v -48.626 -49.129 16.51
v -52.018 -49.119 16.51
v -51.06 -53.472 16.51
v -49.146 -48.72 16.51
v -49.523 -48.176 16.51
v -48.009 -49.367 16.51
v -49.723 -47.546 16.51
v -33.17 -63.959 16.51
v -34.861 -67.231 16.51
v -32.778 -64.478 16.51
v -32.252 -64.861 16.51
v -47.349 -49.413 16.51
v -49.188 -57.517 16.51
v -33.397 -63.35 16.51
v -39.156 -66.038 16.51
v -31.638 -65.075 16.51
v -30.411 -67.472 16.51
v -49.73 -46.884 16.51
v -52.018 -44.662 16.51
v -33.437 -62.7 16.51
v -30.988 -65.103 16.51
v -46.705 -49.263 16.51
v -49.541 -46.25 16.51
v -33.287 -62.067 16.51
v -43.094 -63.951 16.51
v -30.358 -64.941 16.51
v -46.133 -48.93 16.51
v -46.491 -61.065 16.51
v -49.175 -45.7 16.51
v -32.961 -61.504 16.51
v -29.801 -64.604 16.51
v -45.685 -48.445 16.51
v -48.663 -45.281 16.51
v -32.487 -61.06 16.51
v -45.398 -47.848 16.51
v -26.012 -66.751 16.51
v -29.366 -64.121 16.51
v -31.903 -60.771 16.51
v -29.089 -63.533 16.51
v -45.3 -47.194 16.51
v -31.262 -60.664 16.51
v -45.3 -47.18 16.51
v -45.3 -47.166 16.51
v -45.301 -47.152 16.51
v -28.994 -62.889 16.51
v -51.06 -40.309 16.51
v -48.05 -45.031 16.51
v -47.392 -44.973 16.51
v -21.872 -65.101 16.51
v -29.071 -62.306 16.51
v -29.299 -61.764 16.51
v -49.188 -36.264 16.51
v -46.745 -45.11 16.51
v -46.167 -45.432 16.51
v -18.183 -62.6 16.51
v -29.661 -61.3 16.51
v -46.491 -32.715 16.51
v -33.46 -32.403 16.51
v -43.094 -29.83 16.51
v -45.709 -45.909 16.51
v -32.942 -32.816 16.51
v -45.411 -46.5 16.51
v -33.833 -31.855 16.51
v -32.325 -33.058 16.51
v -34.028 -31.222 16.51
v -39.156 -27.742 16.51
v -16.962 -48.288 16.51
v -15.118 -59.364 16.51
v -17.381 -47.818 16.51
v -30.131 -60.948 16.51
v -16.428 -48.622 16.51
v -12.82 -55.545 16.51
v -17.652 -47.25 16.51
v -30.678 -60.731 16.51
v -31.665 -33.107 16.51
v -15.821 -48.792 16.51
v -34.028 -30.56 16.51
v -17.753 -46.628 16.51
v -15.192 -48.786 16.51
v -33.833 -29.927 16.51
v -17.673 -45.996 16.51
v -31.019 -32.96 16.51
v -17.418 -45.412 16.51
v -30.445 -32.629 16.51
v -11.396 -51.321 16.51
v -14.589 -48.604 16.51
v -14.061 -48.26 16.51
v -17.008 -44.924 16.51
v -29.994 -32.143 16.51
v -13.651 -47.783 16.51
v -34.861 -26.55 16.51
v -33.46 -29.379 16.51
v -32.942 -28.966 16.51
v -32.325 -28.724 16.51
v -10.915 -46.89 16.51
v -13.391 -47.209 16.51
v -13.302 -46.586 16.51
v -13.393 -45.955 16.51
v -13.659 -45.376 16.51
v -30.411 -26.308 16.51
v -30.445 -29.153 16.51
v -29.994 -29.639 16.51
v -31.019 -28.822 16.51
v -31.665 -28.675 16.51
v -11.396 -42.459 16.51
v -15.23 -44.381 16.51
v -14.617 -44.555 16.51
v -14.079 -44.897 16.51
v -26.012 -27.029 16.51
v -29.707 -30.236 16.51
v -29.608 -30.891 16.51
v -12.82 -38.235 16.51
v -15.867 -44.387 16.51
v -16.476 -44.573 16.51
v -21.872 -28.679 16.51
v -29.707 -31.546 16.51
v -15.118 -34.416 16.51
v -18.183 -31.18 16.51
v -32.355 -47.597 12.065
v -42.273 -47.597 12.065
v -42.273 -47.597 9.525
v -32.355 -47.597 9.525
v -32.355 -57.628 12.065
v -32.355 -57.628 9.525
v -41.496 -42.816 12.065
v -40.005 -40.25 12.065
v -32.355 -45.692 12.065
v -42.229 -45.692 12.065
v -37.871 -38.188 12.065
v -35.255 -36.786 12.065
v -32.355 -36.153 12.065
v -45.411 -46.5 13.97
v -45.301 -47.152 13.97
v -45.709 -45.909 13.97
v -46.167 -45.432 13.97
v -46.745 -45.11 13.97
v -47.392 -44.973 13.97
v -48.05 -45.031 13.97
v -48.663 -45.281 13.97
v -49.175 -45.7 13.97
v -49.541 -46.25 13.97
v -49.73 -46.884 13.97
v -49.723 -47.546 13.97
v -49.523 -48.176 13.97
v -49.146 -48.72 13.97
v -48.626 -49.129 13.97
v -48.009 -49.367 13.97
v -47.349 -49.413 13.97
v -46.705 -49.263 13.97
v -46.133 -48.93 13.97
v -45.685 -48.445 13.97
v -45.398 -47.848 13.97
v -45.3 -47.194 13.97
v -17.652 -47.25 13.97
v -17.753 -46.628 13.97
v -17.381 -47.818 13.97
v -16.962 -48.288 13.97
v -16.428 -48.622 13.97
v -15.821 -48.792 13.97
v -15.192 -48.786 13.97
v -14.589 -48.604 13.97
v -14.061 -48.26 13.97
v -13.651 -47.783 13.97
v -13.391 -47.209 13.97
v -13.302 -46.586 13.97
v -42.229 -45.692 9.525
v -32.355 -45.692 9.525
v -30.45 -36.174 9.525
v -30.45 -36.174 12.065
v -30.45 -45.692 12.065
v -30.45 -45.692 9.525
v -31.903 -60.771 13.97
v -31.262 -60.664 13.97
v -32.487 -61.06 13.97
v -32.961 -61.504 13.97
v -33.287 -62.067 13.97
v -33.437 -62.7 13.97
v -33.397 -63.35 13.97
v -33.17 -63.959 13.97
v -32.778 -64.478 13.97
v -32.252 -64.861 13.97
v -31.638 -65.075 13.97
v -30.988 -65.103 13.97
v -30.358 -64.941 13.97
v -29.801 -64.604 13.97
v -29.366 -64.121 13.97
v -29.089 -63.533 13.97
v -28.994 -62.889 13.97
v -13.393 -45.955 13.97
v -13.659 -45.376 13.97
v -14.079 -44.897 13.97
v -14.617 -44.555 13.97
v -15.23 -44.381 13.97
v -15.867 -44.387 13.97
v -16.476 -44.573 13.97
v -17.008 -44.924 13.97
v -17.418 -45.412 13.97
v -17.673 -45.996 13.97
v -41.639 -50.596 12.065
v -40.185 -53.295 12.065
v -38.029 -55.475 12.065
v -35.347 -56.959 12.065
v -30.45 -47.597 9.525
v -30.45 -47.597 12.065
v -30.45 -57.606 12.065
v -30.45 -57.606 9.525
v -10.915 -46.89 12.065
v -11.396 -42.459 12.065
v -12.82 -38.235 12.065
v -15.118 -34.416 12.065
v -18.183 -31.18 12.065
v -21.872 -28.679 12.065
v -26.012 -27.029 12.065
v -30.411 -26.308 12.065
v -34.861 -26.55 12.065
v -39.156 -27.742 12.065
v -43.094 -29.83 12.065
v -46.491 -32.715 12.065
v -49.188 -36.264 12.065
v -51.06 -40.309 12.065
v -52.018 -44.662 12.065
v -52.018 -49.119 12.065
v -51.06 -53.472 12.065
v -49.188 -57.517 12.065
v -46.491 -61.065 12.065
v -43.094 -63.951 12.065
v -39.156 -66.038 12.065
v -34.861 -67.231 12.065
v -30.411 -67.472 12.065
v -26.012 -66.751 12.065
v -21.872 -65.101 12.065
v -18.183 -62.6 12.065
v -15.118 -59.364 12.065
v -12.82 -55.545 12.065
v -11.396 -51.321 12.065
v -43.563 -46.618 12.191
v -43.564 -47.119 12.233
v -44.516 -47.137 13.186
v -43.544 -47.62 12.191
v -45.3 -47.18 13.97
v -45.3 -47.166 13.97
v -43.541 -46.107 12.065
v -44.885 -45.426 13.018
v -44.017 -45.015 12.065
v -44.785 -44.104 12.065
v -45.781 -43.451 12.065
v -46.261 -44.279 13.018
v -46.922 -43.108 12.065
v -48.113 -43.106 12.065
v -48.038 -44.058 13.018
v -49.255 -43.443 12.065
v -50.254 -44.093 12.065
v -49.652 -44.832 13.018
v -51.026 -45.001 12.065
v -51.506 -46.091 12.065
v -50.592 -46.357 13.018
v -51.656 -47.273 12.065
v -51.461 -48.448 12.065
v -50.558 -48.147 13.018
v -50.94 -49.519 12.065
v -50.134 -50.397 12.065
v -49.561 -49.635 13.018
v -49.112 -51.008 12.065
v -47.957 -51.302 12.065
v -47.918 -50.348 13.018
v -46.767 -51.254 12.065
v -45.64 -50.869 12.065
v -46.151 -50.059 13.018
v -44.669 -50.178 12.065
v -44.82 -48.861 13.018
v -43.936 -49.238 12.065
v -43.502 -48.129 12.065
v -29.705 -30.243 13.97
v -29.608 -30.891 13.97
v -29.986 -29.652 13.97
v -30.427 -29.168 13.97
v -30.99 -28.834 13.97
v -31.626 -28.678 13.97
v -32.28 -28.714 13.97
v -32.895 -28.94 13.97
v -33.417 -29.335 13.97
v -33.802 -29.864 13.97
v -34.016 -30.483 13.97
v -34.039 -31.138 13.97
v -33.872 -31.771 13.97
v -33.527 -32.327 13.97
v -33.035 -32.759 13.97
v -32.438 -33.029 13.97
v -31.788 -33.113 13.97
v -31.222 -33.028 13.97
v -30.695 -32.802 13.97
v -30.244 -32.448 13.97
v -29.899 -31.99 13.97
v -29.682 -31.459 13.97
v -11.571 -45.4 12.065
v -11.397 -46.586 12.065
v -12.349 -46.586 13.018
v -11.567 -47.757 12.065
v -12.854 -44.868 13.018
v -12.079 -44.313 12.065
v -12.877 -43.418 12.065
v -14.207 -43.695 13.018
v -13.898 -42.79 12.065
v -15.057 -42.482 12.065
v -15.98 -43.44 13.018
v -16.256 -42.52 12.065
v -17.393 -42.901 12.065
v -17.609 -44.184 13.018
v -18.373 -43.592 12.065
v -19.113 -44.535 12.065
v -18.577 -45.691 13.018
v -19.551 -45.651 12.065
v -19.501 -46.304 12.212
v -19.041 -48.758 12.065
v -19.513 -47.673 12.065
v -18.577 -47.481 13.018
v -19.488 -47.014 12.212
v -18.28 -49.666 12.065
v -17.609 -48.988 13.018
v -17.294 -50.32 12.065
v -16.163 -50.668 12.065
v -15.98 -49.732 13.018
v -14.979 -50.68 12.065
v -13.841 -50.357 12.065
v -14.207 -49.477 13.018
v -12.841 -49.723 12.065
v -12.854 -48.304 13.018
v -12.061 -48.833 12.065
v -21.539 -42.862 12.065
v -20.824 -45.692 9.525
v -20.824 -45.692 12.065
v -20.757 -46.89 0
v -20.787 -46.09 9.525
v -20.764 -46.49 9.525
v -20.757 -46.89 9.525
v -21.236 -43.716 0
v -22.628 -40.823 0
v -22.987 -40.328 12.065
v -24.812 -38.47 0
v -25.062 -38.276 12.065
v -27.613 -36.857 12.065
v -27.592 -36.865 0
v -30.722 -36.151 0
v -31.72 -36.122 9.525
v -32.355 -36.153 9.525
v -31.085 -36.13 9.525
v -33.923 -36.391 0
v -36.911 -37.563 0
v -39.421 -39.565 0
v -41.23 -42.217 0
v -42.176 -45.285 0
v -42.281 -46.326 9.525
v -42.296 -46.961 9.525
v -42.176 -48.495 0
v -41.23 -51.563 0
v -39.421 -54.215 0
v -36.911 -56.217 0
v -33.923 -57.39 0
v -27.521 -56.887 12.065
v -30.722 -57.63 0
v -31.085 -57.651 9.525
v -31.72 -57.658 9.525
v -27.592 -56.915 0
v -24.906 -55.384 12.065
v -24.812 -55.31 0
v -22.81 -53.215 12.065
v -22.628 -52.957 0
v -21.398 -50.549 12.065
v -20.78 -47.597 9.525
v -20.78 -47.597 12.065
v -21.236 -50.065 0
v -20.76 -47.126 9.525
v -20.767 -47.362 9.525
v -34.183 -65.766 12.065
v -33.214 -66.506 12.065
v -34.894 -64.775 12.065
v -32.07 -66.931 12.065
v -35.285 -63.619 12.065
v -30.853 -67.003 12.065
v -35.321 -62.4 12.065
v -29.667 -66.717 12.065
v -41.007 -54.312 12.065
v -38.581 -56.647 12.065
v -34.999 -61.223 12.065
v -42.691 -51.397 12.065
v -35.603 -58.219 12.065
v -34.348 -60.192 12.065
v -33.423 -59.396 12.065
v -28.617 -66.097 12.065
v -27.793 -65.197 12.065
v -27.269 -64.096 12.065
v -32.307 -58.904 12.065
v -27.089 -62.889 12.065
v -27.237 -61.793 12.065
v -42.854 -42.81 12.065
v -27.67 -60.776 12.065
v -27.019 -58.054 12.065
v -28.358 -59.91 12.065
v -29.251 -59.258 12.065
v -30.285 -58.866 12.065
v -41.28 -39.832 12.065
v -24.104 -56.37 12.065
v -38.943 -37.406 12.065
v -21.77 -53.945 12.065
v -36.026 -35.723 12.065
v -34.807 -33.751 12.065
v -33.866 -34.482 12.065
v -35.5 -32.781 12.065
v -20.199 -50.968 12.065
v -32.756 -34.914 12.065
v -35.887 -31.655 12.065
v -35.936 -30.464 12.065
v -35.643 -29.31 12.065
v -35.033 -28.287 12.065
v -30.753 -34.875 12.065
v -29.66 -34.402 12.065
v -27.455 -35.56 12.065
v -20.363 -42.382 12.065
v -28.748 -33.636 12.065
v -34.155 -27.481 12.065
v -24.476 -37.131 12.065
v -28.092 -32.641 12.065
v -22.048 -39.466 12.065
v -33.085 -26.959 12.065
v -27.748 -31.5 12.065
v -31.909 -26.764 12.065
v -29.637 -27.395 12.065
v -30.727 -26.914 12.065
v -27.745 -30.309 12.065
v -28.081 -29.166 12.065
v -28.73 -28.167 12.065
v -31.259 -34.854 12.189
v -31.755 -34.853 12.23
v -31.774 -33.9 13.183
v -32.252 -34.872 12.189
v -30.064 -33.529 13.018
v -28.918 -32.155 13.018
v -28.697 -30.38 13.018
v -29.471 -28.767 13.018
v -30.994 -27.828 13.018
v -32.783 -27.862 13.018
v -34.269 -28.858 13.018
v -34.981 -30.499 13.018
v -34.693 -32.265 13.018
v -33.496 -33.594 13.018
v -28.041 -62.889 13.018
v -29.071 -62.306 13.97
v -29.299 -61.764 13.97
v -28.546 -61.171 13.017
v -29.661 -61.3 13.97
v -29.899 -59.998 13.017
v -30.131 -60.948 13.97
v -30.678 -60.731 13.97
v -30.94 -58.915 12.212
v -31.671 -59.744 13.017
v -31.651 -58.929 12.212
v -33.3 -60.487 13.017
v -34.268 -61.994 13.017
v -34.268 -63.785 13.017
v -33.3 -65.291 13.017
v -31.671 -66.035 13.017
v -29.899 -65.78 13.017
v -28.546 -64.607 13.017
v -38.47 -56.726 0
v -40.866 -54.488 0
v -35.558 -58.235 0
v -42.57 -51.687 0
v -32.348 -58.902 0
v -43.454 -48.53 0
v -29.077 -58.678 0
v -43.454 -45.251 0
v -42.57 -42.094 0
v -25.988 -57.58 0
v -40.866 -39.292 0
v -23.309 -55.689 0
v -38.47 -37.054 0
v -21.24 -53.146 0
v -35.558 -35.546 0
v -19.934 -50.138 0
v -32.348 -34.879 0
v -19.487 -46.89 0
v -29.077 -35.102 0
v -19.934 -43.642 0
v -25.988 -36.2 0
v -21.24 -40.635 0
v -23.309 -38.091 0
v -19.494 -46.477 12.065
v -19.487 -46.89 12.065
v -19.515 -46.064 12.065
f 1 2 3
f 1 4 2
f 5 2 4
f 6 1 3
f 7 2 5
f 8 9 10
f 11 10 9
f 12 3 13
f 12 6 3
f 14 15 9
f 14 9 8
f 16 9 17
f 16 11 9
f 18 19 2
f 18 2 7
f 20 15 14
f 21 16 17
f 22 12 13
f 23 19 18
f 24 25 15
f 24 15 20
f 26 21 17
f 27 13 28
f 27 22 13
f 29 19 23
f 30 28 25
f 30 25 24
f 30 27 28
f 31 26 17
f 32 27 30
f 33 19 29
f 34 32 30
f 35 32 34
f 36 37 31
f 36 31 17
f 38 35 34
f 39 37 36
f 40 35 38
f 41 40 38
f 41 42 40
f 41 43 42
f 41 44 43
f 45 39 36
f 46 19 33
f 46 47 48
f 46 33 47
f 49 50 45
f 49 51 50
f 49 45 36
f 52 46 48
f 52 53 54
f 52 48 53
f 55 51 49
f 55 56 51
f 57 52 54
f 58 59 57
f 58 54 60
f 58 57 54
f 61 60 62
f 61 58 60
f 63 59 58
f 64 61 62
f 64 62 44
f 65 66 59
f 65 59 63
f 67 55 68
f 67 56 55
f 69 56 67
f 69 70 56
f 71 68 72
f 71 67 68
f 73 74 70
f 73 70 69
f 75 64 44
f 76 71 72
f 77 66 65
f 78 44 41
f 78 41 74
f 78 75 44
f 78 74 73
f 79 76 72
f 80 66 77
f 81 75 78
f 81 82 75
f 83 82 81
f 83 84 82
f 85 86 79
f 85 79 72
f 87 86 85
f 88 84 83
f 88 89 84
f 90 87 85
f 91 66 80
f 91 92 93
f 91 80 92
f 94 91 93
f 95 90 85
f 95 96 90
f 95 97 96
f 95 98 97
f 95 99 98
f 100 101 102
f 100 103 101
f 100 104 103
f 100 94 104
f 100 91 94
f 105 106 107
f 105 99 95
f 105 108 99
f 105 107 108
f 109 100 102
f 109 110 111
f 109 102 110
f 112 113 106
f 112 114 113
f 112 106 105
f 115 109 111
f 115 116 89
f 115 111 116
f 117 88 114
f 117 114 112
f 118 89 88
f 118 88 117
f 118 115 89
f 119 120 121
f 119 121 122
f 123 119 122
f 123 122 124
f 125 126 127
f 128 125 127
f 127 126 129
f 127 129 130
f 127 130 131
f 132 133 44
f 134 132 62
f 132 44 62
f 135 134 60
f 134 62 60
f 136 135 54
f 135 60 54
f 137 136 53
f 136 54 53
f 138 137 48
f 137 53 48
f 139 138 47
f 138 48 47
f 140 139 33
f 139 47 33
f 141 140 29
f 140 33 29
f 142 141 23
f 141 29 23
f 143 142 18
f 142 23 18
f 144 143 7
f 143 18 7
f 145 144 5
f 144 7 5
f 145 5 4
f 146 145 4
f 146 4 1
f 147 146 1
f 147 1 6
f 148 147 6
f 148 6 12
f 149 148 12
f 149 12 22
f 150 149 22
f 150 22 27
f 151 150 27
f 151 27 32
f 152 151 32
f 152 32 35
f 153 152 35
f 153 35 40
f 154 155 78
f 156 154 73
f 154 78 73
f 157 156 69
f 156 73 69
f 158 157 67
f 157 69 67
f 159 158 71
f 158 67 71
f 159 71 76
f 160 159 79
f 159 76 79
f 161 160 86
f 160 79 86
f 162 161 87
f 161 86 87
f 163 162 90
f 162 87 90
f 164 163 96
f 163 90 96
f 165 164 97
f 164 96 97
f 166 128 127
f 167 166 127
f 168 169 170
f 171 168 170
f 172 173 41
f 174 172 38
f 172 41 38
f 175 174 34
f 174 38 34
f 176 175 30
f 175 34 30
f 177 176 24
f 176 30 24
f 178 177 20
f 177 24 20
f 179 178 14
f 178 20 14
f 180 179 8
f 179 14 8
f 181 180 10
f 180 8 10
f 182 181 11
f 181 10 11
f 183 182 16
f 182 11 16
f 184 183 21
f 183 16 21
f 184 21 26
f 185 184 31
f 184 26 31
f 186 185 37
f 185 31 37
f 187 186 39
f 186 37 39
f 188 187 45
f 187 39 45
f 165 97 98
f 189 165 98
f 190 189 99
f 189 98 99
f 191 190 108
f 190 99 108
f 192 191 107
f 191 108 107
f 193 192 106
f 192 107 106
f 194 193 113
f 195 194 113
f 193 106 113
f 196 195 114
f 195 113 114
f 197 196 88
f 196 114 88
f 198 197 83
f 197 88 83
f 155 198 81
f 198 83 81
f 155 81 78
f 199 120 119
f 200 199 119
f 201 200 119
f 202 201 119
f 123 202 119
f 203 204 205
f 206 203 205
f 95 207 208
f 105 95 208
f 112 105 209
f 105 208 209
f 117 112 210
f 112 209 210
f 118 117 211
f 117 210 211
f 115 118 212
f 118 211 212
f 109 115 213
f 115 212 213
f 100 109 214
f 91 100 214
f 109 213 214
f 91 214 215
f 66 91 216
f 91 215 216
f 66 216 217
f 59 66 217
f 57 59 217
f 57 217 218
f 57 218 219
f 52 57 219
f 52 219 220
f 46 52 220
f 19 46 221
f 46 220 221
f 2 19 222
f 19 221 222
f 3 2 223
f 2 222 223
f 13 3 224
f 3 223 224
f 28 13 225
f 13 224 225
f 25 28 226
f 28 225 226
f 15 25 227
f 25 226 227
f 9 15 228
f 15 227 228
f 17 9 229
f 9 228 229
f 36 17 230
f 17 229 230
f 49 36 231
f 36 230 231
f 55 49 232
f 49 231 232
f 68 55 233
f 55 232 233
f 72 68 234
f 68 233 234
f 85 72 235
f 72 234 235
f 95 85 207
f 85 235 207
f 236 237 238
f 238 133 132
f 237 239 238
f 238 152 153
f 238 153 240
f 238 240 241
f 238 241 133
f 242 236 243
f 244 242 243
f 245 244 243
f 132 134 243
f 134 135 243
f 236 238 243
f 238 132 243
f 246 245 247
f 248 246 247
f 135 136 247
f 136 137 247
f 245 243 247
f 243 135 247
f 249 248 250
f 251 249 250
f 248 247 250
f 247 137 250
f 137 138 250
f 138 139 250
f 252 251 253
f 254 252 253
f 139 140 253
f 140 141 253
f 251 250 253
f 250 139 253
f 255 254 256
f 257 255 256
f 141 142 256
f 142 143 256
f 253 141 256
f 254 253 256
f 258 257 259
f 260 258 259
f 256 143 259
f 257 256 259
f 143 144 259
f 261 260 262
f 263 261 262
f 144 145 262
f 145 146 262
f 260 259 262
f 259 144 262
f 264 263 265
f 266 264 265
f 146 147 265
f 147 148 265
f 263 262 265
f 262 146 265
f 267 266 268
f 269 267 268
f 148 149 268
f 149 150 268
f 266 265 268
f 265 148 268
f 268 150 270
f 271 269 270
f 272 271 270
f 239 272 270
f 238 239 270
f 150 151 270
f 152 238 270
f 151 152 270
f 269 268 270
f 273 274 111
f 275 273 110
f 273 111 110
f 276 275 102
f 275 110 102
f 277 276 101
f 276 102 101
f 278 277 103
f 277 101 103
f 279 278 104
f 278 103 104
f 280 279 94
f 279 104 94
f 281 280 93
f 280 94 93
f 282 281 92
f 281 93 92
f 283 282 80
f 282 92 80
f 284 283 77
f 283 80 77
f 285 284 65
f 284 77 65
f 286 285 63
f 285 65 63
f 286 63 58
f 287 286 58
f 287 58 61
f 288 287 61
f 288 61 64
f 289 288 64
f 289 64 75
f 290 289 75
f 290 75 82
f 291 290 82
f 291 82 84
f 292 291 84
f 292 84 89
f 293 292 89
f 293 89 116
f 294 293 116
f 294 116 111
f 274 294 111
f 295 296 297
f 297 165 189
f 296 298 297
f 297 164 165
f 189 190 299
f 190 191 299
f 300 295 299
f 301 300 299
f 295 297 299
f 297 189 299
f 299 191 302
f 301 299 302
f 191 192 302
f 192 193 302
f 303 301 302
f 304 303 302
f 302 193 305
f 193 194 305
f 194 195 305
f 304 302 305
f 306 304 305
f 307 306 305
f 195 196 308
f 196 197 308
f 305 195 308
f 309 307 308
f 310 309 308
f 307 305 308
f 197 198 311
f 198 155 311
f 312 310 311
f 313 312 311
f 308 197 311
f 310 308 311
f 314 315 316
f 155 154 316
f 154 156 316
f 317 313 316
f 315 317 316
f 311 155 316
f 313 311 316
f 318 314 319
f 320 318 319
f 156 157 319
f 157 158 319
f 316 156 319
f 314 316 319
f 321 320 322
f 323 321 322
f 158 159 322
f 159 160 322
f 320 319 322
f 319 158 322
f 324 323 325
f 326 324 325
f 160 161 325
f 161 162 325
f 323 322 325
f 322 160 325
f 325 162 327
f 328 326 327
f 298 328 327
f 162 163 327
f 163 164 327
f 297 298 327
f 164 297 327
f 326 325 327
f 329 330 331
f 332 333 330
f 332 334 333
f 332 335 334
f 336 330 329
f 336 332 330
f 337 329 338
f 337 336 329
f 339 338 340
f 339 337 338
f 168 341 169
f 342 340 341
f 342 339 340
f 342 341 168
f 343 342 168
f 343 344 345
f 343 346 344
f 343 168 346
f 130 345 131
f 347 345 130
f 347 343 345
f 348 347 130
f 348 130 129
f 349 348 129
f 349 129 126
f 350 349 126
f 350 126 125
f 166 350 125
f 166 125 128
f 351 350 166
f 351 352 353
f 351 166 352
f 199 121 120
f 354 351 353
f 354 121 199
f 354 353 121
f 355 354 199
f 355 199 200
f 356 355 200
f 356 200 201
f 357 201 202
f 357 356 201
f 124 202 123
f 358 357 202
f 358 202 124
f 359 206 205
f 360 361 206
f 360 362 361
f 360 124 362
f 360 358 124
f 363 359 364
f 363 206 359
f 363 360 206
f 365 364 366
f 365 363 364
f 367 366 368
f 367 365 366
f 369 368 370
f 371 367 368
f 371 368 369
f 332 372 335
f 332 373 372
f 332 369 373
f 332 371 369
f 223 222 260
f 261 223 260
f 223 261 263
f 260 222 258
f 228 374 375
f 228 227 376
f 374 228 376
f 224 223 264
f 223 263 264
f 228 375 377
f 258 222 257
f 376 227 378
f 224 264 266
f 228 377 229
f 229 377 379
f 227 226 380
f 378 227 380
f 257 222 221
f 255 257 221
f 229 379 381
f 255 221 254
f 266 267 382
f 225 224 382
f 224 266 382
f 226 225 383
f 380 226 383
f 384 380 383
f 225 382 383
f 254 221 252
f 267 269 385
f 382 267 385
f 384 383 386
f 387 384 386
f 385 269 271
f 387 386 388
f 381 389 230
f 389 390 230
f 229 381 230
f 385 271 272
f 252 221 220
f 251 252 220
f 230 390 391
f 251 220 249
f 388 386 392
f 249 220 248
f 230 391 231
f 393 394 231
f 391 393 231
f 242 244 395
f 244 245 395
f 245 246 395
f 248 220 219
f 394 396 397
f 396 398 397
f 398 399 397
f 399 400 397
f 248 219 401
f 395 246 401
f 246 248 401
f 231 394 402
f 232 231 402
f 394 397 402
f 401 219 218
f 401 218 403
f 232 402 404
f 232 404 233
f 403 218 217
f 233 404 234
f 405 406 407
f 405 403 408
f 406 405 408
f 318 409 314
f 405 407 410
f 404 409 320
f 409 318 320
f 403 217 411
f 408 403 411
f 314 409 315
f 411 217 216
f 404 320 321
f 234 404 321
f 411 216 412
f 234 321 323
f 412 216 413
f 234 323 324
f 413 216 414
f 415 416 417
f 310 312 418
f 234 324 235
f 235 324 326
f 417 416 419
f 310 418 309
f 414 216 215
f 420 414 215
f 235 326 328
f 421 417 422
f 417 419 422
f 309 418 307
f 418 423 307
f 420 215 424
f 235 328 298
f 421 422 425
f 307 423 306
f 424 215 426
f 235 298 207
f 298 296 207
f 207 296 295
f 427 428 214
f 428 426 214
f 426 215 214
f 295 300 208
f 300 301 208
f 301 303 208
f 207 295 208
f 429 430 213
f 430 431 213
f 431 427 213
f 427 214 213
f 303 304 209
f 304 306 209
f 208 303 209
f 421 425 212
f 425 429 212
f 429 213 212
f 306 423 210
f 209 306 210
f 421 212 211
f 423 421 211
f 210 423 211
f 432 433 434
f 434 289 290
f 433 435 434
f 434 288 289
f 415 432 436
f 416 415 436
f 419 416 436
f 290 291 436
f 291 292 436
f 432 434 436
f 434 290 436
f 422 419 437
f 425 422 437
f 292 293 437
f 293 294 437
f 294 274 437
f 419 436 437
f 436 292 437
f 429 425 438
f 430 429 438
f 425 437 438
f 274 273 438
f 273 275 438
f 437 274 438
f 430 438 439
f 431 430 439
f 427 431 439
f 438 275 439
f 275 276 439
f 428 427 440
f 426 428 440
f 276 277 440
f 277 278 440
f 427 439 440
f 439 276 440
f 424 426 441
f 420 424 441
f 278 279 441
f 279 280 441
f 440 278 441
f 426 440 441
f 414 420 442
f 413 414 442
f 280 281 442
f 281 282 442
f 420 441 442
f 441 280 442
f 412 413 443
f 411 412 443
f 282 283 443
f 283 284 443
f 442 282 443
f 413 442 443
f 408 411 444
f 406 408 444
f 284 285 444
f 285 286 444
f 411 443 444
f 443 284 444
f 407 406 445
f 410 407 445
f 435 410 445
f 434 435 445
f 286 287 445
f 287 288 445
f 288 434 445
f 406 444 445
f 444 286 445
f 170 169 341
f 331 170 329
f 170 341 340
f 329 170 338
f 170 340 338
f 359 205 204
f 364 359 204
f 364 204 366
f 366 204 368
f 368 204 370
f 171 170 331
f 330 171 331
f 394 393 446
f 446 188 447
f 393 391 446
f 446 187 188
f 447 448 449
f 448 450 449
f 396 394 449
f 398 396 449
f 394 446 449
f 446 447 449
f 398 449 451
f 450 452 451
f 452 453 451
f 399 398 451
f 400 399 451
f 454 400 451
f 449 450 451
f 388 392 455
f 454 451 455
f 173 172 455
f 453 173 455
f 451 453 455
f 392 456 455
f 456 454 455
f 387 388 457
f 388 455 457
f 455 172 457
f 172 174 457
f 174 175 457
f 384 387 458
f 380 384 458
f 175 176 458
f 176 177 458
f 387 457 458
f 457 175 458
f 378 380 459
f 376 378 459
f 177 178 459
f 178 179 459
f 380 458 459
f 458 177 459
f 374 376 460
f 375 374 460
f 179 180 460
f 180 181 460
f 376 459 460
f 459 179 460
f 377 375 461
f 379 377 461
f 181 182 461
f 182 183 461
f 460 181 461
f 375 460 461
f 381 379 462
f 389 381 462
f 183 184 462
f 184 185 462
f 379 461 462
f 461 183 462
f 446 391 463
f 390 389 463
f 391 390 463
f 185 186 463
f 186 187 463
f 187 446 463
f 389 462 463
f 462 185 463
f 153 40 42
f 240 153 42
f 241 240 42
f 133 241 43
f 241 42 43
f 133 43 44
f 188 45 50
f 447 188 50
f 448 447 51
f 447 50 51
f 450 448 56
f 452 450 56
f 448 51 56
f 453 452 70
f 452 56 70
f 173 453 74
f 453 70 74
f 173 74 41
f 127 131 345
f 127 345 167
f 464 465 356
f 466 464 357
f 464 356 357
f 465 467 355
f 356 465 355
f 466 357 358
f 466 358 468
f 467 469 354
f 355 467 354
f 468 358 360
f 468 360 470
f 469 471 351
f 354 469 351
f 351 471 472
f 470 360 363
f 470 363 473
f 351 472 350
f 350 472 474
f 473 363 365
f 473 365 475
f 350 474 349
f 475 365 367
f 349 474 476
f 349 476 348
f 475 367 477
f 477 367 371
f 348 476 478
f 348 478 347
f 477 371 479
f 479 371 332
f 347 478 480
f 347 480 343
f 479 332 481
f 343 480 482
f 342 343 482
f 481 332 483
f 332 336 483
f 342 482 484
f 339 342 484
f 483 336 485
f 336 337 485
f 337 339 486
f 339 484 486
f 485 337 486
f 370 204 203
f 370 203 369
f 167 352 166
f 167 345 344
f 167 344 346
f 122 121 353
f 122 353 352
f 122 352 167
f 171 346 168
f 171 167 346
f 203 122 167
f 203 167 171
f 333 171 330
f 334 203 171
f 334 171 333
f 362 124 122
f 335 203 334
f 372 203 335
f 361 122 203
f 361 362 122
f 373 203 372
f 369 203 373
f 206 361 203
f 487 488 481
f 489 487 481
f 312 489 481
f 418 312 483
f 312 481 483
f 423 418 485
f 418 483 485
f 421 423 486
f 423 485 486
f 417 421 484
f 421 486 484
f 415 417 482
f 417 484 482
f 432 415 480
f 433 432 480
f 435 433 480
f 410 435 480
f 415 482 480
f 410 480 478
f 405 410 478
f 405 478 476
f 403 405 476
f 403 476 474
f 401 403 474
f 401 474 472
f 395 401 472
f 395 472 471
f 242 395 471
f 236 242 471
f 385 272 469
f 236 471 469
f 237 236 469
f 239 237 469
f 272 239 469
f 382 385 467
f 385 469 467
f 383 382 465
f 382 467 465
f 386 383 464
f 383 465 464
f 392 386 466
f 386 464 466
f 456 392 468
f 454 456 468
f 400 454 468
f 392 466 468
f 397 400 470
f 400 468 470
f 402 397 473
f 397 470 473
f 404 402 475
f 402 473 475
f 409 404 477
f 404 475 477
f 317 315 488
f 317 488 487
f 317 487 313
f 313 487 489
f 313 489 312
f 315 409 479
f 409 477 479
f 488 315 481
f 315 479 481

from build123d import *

# Parameters (mm, degrees)
F0_R         = 12.0396
F0_R_2       = 10.7696
F1_DEPTH     = 12.065
F2_R         = 20.6121
F3_DEPTH     = 4.445
F5_DEPTH     = 16.511
F6_S5_R      = 12.0396
F6_T6_DEPTH  = 7
F6_S11_R     = 12.0396
F6_T12_DEPTH = 7
F6_S17_R     = 12.0396
F6_T18_DEPTH = 7
F6_S23_R     = 12.0396
F6_T24_DEPTH = 7
F7_W         = 10.7836972851
F7_H         = 1.905
F7_W_2       = 1.905
F7_H_2       = 10.8237928489
F7_W_3       = 10.1713027149
F7_H_3       = 10.1312071511
F8_DEPTH     = 2.54


# Not quite as in the source:
# - a fillet or chamfer that OpenCascade refuses, or shapes differently, is made with other operations: its cross-section is extruded or revolved along the edge and cut away or added


with BuildPart() as f1:
    # F0 (on Top) → F1 (new body)
    with BuildSketch(Plane.XY):
        with Locations((-31.5266512334, -46.8901731074)):
            Circle(F0_R)
        with Locations((-31.5266512334, -46.8901731074)):
            Circle(F0_R_2, mode=Mode.SUBTRACT)
    extrude(amount=F1_DEPTH)

    # F2 (on face) → F3 (join)
    with BuildSketch(Plane.XY.offset(12.065)):
        with Locations((-31.5266512334, -46.8901731074)):
            Circle(F2_R)
    extrude(amount=F3_DEPTH)

    # F4 (on face) → F5 (cut, through all)
    with BuildSketch(Plane.XY.offset(16.51)):
        with BuildLine():
            ThreePointArc((-31.7884928641, -33.1131611233), (-30.2443193797, -32.4476041714), (-29.6082253852, -30.8910624162))
            ThreePointArc((-29.6082253852, -30.8910624162), (-33.4171313906, -29.3345206609), (-31.7884928641, -33.1131611233))
        make_face()
        with BuildLine():
            ThreePointArc((-13.3019866134, -46.5860989557), (-15.5486867731, -44.3606454902), (-17.7526926267, -46.6283895083))
            ThreePointArc((-17.7526926267, -46.6283895083), (-15.5063943113, -48.8115524211), (-13.3019866134, -46.5860989557))
        make_face()
        with BuildLine():
            ThreePointArc((-28.9935999678, -62.8892183723), (-29.6606432601, -61.3004657527), (-31.2619205449, -60.6640753873))
            ThreePointArc((-31.2619205449, -60.6640753873), (-32.777664533, -64.4779709918), (-28.9935999678, -62.8892183723))
        make_face()
        with BuildLine():
            ThreePointArc((-45.3002079959, -47.1942472591), (-45.3003084592, -47.1731010282), (-45.3006098402, -47.1519567065))
            ThreePointArc((-45.3006098402, -47.1519567065), (-49.7512153901, -47.21539349), (-45.3002079959, -47.1942472591))
        make_face()
    extrude(amount=-F5_DEPTH, mode=Mode.SUBTRACT)

    # F6: chamfer of 1.905 on 4 edges, made by hand


with BuildPart() as f6_tool2:
    # F6_s3 → F6_t4 (revolve)
    with BuildSketch(Plane.XZ.offset(62.8892183723)):
        Polygon((-27.0885999678, 12.065), (-28.9935999678, 13.97), (-28.9935999678, 12.065), align=None)
    revolve(axis=Axis((-31.2191538966, -62.8892183723, 12.065), (0, 0, 1)))

    # F6_s5 → F6_t6 (cut, symmetric)
    with BuildSketch(Plane.XY.offset(13)):
        with Locations((-31.5266512334, -46.8901731074)):
            Circle(F6_S5_R)
    extrude(amount=F6_T6_DEPTH, both=True, mode=Mode.SUBTRACT)


with BuildPart() as f1_1:
    add(f1.part)

    # F6_t1: cut F6_tool2
    add(f6_tool2.part, mode=Mode.SUBTRACT)


with BuildPart() as f6_tool8:
    # F6_s9 → F6_t10 (revolve)
    with BuildSketch(Plane.XZ.offset(46.5860989557)):
        Polygon((-11.3969866134, 12.065), (-13.3019866134, 13.97), (-13.3019866134, 12.065), align=None)
    revolve(axis=Axis((-15.5275405422, -46.5860989557, 12.065), (0, 0, 1)))

    # F6_s11 → F6_t12 (cut, symmetric)
    with BuildSketch(Plane.XY.offset(13)):
        with Locations((-31.5266512334, -46.8901731074)):
            Circle(F6_S11_R)
    extrude(amount=F6_T12_DEPTH, both=True, mode=Mode.SUBTRACT)


with BuildPart() as f1_2:
    add(f1_1.part)

    # F6_t7: cut F6_tool8
    add(f6_tool8.part, mode=Mode.SUBTRACT)


with BuildPart() as f6_tool14:
    # F6_s15 → F6_t16 (revolve)
    with BuildSketch(Plane(origin=(0.8794745138, -46.2742722997, 0), x_dir=(0, 0, 1), z_dir=(0.0190022592, -0.9998194408, 0))):
        Polygon((12.065, 44.2834241002), (13.97, 46.1884241002), (12.065, 46.1884241002), align=None)
    revolve(axis=Axis((-47.5257619247, -47.1942472591, 12.065), (0, 0, 1)))

    # F6_s17 → F6_t18 (cut, symmetric)
    with BuildSketch(Plane.XY.offset(13)):
        with Locations((-31.5266512334, -46.8901731074)):
            Circle(F6_S17_R)
    extrude(amount=F6_T18_DEPTH, both=True, mode=Mode.SUBTRACT)


with BuildPart() as f1_3:
    add(f1_2.part)

    # F6_t13: cut F6_tool14
    add(f6_tool14.part, mode=Mode.SUBTRACT)


with BuildPart() as f6_tool20:
    # F6_s21 → F6_t22 (revolve)
    with BuildSketch(Plane(origin=(-32.4061257472, -0.6159008077, 0), x_dir=(0, 0, 1), z_dir=(-0.9998194408, -0.0190022592, 0))):
        Polygon((12.065, -34.4081290555), (13.97, -32.5031290555), (12.065, -32.5031290555), align=None)
    revolve(axis=Axis((-31.8307253852, -30.8910624162, 12.065), (0, 0, 1)))

    # F6_s23 → F6_t24 (cut, symmetric)
    with BuildSketch(Plane.XY.offset(13)):
        with Locations((-31.5266512334, -46.8901731074)):
            Circle(F6_S23_R)
    extrude(amount=F6_T24_DEPTH, both=True, mode=Mode.SUBTRACT)


with BuildPart() as f1_4:
    add(f1_3.part)

    # F6_t19: cut F6_tool20
    add(f6_tool20.part, mode=Mode.SUBTRACT)

    # F7 (on face) → F8 (join)
    with BuildSketch(Plane(origin=(0, 0, 12.065), x_dir=(1, 0, 0), z_dir=(0, 0, -1))):
        with Locations((-37.7473032813, 46.6444636265)):
            Rectangle(F7_W, F7_H)
        with Locations((-31.4029546387, 53.008860051)):
            Rectangle(F7_W_2, F7_H_2)
        with Locations((-31.4029546387, 46.6444636265)):
            Rectangle(F7_W_2, F7_H)
        with Locations((-25.3648032813, 46.6444636265)):
            Rectangle(F7_W_3, F7_H)
        with Locations((-31.4029546387, 40.626360051)):
            Rectangle(F7_W_2, F7_H_3)
    extrude(amount=F8_DEPTH)


solid = f1_4.part
